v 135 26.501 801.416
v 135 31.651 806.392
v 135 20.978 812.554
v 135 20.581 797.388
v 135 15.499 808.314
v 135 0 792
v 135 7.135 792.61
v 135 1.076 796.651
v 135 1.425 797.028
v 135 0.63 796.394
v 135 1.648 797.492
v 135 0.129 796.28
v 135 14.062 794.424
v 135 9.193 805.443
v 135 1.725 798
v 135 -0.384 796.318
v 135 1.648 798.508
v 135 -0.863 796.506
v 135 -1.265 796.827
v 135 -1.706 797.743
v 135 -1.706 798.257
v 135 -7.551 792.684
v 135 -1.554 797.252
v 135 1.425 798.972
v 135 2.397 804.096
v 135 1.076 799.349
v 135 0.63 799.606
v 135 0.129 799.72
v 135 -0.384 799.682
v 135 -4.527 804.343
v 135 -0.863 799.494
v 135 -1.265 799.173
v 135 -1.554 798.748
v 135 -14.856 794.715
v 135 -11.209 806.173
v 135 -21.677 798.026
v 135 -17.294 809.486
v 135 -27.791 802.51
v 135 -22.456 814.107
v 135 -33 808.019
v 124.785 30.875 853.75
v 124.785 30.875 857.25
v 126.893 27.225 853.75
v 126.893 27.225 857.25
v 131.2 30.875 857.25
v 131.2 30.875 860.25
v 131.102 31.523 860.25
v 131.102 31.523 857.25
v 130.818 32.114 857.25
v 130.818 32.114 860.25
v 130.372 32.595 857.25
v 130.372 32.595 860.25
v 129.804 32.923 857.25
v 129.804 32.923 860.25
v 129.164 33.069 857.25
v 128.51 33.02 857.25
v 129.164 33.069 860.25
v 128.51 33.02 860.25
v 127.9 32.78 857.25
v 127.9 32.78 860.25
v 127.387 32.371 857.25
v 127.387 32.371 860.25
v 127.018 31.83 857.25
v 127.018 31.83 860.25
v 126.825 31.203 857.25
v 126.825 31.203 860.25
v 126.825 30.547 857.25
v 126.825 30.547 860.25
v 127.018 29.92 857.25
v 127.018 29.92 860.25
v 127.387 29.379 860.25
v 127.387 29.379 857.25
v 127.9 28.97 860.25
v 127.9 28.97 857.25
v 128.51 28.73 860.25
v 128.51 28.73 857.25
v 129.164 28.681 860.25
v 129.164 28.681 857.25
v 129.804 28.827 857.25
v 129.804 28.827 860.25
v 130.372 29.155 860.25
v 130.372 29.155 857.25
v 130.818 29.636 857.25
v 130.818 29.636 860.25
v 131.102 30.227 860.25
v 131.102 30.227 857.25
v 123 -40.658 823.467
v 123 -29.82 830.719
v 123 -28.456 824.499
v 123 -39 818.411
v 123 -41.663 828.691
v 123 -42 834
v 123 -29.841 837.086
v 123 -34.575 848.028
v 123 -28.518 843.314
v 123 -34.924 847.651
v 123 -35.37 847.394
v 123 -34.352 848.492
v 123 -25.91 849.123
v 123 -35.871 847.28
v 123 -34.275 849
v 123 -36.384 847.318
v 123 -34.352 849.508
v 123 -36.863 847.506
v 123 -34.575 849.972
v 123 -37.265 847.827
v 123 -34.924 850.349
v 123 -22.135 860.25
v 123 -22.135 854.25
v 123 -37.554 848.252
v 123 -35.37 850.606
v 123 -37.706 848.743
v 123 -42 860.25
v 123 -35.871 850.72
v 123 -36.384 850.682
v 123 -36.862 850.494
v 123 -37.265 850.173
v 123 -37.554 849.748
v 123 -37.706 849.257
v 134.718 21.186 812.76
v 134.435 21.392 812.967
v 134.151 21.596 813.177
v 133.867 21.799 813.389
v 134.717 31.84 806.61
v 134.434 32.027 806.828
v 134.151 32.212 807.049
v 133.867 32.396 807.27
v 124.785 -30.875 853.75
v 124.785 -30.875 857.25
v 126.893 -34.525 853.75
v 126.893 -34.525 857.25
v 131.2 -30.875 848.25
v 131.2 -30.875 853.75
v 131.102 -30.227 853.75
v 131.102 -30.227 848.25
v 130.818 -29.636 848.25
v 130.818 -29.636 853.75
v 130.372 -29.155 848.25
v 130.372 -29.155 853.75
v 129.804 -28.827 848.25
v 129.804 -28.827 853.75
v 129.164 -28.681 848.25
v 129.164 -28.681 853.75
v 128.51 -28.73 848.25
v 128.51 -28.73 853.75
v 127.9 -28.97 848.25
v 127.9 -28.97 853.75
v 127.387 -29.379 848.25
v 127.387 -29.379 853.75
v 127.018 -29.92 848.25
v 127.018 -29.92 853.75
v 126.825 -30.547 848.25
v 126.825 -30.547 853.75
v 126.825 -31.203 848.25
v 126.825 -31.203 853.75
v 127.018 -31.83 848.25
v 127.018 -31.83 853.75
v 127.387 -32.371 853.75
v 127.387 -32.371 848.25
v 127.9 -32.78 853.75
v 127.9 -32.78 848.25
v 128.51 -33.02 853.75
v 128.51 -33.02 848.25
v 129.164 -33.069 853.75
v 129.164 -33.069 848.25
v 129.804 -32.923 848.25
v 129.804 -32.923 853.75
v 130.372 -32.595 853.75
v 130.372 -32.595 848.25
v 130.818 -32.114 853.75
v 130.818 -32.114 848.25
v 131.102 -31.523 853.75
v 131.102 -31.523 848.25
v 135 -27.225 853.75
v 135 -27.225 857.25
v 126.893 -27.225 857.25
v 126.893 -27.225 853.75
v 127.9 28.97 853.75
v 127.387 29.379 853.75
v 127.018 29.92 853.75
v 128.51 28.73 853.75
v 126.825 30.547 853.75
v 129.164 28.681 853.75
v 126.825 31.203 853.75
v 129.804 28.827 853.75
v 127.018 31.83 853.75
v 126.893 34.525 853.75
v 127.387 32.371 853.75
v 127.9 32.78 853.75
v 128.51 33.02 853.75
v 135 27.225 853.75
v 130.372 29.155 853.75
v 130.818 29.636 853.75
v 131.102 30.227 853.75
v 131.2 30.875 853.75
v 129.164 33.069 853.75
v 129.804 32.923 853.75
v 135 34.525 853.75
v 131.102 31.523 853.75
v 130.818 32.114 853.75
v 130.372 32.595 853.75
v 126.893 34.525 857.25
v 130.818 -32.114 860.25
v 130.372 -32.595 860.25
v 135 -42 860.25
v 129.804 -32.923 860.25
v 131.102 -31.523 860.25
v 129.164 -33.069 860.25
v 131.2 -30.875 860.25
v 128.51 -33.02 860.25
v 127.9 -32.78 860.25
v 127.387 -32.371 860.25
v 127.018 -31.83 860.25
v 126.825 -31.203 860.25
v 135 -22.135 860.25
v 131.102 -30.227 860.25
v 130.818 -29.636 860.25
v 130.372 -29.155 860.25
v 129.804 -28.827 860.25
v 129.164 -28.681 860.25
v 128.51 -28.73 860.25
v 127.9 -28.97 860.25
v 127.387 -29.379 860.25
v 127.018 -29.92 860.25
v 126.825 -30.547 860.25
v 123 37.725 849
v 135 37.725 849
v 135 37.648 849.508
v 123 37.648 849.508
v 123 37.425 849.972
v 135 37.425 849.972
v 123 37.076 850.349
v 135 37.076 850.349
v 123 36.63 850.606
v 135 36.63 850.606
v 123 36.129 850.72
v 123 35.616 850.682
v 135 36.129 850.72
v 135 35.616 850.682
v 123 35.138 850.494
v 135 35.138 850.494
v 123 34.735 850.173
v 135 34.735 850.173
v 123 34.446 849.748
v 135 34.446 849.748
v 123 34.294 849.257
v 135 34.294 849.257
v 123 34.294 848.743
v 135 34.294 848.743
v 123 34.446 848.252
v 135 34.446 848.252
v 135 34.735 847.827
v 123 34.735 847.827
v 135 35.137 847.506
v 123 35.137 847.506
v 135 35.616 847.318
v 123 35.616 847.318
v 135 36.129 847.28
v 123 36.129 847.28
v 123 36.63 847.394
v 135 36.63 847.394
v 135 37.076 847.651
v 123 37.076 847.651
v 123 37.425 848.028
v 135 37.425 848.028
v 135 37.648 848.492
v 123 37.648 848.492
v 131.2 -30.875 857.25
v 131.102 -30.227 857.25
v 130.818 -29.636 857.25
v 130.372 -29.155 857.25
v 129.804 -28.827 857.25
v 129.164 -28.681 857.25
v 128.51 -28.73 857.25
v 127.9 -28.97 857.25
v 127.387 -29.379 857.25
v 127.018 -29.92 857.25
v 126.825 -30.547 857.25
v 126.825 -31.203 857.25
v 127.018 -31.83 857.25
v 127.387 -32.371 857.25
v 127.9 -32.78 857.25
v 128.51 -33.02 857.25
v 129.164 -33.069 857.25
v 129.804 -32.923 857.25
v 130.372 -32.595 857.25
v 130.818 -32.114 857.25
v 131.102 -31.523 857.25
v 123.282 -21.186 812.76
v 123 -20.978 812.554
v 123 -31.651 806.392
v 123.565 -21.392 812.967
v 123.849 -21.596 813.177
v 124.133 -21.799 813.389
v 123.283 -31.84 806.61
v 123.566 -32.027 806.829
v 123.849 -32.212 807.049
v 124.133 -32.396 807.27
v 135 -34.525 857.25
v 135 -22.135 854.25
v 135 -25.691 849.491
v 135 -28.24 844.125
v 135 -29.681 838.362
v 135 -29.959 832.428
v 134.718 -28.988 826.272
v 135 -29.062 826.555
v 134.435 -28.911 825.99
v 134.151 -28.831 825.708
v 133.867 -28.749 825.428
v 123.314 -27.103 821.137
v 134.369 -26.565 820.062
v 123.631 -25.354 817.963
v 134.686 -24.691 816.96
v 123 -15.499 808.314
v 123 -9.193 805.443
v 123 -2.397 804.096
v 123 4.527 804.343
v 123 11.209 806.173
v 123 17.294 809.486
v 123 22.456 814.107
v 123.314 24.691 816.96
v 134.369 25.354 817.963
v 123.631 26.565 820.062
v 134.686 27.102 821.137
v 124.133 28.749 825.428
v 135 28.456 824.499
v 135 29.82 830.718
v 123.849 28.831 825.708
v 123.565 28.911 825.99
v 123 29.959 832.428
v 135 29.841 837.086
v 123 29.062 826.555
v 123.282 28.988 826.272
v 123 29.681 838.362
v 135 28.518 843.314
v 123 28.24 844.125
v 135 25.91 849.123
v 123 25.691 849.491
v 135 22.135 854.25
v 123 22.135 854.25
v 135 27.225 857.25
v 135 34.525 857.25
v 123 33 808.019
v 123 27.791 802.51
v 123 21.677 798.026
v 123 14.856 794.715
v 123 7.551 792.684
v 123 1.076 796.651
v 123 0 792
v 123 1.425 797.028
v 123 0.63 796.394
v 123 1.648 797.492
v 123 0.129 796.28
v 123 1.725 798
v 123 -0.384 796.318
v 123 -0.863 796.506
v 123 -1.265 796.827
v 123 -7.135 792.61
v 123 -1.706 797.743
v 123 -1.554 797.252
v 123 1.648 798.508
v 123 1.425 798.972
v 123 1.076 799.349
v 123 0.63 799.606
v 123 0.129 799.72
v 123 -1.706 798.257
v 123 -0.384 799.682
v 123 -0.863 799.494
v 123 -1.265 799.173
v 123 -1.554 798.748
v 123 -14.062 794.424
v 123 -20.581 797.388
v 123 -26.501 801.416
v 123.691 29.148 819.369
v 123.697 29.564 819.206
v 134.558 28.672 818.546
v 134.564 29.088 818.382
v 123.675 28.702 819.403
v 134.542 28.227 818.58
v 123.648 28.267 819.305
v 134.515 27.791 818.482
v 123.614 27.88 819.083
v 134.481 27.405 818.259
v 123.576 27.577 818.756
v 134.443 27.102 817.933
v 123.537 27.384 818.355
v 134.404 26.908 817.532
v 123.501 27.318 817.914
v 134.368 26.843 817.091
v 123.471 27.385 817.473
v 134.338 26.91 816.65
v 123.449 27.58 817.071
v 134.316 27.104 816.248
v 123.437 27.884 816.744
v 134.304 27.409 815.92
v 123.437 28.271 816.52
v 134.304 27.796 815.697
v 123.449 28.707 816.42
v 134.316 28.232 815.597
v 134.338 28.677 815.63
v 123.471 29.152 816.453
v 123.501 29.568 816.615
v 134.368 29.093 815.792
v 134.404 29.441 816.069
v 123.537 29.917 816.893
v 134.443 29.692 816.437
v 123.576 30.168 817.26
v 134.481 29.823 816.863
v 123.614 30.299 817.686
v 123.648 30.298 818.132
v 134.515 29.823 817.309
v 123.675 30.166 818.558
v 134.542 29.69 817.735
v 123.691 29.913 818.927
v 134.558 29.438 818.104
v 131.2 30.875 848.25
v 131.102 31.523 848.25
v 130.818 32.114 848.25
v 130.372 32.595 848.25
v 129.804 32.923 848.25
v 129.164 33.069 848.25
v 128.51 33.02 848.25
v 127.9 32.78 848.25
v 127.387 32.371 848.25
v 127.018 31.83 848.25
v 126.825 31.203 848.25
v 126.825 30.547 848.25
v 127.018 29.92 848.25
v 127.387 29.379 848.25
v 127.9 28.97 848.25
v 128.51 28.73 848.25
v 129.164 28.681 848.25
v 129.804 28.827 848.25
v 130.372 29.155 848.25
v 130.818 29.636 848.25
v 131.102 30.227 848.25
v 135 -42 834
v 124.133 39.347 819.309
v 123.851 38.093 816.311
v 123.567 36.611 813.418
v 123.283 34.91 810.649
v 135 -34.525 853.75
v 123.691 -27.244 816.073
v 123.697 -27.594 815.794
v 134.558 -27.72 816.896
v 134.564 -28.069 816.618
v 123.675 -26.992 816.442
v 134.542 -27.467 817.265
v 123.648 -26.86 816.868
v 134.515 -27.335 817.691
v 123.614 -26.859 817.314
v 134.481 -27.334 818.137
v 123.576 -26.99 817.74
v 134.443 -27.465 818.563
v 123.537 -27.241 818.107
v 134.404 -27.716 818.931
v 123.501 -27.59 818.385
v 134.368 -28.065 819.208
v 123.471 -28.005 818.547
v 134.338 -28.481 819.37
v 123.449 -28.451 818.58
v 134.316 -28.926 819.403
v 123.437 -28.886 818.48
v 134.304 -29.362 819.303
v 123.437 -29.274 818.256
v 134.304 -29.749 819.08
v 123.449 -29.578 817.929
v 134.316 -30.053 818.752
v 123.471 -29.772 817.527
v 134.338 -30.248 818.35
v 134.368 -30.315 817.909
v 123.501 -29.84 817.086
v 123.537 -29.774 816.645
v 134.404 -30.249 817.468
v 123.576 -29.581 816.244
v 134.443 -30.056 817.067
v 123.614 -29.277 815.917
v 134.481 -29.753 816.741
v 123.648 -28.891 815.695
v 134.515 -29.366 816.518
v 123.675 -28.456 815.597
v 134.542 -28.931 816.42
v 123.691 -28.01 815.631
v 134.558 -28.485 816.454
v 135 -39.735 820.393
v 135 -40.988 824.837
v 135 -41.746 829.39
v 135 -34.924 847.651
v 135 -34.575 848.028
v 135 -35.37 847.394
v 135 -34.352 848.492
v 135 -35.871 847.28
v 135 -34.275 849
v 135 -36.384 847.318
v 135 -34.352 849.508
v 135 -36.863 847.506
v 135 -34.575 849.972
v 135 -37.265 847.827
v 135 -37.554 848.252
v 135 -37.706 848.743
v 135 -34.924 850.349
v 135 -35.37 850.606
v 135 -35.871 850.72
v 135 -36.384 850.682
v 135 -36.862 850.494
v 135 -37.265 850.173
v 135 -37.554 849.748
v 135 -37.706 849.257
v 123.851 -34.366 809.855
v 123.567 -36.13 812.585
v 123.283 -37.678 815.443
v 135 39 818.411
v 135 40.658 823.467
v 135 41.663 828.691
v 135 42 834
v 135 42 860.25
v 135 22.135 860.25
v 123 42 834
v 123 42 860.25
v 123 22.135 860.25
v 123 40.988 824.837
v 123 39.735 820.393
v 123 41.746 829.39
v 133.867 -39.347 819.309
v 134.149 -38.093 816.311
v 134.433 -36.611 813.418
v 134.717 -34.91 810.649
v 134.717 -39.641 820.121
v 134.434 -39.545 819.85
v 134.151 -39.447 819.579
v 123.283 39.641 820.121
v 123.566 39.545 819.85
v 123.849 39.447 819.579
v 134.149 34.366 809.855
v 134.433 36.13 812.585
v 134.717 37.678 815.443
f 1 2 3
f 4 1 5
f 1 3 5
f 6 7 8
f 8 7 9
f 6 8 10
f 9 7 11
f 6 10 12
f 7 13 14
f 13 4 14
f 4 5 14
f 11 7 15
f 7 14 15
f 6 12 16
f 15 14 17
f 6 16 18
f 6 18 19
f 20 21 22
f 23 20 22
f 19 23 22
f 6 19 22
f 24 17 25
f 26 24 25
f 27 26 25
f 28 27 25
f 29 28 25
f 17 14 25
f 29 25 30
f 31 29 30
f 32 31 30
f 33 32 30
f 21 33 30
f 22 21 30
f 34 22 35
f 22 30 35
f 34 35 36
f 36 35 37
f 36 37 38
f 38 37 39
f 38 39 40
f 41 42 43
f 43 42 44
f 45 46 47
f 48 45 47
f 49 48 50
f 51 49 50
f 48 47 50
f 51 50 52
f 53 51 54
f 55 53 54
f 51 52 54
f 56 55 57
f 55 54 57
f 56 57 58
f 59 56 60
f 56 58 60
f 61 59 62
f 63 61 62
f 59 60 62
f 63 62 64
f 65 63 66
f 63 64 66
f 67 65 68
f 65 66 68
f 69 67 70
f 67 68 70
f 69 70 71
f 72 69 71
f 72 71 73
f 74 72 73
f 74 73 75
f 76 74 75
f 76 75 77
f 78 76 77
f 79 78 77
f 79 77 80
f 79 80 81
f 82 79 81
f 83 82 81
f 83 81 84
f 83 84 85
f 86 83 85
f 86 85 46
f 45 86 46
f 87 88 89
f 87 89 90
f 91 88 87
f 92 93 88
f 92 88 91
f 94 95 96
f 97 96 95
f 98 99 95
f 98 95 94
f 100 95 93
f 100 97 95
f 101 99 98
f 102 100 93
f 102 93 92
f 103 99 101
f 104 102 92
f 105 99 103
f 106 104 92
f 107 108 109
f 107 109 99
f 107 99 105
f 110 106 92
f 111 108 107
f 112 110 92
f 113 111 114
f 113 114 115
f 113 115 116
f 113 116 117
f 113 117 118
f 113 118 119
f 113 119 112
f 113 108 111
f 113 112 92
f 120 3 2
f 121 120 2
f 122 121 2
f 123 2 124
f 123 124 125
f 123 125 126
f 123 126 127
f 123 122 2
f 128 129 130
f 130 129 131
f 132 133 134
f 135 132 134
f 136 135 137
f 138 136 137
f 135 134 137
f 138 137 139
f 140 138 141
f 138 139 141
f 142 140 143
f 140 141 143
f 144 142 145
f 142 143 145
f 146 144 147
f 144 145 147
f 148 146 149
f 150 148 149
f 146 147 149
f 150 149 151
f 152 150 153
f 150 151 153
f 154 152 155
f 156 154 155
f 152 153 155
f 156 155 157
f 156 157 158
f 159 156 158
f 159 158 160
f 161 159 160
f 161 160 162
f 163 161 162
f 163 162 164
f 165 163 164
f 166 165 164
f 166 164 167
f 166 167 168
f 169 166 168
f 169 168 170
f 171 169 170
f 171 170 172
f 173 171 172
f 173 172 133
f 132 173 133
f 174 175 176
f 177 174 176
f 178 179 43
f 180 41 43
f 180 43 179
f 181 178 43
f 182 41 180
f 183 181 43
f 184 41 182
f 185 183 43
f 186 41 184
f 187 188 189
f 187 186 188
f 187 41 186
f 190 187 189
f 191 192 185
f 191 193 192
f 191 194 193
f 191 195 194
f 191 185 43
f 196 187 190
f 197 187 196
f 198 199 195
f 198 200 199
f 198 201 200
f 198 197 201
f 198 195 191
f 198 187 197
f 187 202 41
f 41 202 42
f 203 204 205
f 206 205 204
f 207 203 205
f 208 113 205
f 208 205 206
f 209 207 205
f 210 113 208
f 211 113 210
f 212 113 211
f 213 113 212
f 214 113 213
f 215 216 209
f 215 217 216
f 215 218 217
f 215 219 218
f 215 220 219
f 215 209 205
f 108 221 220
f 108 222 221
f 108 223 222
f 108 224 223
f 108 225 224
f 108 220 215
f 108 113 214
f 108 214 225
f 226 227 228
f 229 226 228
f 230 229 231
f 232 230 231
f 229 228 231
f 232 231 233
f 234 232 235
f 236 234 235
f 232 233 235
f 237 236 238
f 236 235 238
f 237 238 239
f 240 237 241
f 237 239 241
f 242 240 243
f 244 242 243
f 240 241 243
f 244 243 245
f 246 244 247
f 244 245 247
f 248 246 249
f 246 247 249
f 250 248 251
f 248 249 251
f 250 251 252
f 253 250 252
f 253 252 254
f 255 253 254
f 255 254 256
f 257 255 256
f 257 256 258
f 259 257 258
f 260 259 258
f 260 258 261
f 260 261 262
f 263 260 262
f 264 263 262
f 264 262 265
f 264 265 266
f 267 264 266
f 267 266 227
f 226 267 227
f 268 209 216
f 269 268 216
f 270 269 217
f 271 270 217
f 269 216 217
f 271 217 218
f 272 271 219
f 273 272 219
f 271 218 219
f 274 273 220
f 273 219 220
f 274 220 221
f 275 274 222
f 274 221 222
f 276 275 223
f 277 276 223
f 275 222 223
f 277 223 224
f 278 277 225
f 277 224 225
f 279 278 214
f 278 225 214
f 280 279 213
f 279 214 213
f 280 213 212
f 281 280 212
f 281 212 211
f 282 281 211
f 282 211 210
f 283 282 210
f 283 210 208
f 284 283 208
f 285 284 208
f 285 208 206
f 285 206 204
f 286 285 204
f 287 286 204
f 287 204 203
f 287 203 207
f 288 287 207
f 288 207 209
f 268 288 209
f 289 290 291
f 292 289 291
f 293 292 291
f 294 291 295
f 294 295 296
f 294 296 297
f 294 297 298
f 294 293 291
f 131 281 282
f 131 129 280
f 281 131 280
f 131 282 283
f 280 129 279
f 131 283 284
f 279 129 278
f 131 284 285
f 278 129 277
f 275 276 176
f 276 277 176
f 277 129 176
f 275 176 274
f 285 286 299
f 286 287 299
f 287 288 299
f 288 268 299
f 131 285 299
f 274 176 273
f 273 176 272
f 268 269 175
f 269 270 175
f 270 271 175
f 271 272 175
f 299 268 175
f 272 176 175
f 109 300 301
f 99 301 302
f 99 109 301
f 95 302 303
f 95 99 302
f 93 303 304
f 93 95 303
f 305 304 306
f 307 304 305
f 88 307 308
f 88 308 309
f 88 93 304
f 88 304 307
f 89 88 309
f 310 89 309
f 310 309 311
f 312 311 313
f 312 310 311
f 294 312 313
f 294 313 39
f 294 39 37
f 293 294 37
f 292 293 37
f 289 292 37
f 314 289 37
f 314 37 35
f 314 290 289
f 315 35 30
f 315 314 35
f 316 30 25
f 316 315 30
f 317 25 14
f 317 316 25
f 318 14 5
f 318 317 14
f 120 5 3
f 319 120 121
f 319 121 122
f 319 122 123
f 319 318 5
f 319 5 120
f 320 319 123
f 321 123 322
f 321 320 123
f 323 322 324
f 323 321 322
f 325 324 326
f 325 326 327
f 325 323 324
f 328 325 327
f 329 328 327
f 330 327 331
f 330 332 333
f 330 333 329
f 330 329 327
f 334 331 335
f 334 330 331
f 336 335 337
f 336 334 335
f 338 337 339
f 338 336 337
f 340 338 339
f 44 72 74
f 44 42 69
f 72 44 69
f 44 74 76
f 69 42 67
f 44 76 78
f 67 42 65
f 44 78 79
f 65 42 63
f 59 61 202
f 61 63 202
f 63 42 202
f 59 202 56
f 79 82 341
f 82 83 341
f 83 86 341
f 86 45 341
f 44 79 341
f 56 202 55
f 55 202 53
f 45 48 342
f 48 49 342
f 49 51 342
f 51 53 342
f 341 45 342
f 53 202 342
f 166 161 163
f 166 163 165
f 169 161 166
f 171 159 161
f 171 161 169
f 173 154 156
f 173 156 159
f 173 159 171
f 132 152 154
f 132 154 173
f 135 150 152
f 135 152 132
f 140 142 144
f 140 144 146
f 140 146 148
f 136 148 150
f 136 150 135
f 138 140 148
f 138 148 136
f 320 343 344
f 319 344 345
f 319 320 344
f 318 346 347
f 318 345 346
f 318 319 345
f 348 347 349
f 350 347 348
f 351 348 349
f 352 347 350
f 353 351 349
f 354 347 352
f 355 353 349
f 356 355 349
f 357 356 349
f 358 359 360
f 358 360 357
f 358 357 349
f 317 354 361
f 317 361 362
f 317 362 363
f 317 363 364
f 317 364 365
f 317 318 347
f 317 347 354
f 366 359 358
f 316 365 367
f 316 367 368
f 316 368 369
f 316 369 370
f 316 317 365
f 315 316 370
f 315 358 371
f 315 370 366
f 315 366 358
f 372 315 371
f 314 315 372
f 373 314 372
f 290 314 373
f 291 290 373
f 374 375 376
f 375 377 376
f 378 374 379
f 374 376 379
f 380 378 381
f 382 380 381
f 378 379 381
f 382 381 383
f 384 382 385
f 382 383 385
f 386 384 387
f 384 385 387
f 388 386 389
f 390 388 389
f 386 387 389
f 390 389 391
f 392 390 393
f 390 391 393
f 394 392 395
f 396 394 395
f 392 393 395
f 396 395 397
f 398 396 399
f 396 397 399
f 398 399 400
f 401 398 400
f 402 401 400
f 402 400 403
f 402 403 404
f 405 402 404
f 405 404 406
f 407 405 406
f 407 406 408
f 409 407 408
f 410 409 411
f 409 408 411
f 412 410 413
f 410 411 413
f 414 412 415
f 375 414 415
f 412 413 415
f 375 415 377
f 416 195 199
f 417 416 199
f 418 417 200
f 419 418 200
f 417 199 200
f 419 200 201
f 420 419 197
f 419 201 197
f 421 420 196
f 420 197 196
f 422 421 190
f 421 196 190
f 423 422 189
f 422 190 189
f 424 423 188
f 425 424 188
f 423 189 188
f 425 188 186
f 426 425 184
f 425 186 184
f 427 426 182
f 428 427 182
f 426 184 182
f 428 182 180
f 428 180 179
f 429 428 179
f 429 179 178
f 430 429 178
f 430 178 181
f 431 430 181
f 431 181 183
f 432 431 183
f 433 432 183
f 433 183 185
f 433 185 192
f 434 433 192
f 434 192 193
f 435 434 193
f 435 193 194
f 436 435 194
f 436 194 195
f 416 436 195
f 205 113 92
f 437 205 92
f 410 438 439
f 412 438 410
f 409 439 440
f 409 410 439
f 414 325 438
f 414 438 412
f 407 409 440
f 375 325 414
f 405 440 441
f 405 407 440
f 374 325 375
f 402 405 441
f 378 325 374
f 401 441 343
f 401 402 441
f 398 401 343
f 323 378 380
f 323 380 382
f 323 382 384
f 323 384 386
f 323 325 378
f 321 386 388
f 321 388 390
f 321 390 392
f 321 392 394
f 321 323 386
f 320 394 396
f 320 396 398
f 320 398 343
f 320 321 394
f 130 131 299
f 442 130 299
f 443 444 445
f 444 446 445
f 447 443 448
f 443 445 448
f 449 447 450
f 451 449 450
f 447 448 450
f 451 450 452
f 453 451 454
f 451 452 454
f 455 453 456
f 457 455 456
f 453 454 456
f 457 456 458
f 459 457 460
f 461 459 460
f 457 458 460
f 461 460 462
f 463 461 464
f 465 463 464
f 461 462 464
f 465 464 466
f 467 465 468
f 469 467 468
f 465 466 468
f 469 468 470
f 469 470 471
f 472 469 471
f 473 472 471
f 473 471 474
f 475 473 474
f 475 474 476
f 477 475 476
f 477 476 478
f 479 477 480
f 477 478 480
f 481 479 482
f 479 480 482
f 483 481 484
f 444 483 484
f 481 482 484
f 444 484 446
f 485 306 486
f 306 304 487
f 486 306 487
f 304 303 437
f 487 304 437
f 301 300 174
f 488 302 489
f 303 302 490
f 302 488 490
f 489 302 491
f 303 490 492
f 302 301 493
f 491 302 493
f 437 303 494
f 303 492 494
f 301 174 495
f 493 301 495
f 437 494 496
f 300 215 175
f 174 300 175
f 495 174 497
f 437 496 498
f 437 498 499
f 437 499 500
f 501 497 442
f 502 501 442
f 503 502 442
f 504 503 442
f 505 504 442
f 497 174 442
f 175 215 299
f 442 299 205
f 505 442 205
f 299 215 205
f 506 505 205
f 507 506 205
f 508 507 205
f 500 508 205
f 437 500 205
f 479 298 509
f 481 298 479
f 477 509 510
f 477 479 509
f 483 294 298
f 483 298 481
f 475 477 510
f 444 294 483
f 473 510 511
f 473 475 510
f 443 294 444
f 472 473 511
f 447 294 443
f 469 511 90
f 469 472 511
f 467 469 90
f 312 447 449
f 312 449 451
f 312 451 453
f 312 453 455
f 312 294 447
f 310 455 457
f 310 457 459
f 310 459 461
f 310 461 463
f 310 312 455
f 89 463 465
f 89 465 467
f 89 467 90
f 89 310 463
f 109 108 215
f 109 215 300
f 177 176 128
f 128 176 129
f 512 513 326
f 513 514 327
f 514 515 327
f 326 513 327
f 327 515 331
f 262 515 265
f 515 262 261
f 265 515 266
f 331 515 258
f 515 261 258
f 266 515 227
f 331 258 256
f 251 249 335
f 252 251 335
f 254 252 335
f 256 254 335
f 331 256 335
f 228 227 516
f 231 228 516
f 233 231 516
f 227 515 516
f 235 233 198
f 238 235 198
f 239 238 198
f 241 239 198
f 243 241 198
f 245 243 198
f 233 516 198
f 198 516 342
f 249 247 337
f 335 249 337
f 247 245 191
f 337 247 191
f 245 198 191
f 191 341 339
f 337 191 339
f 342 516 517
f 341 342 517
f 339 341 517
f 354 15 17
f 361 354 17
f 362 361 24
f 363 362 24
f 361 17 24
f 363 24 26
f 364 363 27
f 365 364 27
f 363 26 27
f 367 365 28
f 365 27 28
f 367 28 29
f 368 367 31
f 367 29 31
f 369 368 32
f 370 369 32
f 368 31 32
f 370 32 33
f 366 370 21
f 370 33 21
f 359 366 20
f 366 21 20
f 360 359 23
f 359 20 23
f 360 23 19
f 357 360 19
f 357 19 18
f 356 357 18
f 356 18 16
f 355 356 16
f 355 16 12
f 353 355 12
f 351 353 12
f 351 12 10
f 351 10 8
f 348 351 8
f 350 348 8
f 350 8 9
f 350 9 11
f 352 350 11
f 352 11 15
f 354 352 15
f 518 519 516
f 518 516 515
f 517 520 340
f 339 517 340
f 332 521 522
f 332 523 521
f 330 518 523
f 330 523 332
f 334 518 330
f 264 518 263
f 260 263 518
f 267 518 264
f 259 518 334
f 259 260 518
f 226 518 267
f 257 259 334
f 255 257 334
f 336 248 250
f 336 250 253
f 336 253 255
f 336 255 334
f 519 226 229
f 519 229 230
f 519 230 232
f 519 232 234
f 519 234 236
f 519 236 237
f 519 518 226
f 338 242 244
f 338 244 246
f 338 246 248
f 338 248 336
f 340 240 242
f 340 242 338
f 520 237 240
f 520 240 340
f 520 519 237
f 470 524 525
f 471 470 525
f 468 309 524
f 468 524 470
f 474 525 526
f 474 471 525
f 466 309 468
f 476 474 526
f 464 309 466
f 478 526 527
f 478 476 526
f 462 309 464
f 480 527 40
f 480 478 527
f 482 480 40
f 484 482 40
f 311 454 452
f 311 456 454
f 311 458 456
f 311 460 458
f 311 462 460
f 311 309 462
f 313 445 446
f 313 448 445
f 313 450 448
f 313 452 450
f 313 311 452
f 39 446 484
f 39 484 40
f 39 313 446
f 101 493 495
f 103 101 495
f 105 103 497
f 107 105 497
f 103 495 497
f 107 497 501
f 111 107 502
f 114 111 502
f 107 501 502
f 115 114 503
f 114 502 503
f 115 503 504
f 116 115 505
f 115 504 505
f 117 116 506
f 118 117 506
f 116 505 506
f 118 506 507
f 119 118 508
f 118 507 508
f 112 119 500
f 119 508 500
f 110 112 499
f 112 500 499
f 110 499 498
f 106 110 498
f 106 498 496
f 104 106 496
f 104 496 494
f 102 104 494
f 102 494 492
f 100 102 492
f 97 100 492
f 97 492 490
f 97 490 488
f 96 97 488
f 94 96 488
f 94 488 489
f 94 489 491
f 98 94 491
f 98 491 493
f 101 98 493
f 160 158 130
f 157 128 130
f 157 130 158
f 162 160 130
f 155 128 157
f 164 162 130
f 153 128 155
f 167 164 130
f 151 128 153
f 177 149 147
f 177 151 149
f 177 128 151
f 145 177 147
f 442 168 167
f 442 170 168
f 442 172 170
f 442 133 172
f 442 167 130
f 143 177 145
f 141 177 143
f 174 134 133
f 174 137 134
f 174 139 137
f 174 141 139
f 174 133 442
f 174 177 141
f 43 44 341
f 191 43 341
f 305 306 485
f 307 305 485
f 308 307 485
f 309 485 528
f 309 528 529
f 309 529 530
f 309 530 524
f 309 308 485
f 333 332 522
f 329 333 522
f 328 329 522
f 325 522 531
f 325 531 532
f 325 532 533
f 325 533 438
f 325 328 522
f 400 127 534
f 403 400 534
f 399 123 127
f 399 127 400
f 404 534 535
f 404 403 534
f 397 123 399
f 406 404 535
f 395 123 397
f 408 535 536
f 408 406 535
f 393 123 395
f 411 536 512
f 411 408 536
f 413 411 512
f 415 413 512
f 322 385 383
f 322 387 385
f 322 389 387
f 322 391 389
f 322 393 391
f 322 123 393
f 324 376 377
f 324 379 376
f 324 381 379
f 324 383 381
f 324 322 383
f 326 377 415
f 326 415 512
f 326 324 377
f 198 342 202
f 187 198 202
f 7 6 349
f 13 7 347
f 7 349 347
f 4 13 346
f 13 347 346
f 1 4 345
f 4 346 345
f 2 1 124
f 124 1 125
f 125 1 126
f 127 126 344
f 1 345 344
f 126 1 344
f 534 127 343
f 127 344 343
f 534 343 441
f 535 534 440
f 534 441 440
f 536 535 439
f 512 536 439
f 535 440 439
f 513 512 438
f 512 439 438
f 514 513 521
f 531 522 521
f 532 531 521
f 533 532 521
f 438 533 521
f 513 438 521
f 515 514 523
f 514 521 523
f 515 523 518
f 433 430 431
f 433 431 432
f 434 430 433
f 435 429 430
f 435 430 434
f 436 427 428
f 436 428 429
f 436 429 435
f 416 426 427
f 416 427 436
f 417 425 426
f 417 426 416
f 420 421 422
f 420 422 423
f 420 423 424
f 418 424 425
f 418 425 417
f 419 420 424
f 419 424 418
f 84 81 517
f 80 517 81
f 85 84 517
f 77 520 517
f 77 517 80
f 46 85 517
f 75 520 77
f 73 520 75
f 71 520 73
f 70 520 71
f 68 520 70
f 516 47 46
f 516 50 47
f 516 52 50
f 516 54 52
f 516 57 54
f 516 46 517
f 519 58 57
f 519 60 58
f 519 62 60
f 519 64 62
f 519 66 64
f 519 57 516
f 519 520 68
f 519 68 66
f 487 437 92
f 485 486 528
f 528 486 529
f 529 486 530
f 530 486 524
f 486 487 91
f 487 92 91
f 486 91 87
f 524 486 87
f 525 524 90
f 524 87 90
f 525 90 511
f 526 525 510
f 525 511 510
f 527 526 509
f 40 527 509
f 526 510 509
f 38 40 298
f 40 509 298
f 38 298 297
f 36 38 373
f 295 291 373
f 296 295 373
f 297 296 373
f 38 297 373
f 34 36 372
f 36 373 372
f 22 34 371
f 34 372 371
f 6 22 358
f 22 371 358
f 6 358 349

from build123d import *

# Parameters (mm, degrees)
PAD006_DEPTH          = 12
SKETCH077_R           = 1.725
HOLE036_DEPTH         = 12.001
SKETCH067_R           = 2.2
POCKET040_DEPTH       = 12
POCKET041_DEPTH       = 3.5
SKETCH027_R           = 1.5
POCKET042_DEPTH       = 227.579227
POCKET042_DEPTH_BACK  = 228.768023
POCKET043_DEPTH       = 275.16353
POLARPATTERN003_COUNT = 2
POLARPATTERN003_ANGLE = 240


with BuildPart() as part:
    # Sketch021 → Pad006 (new body)
    with BuildSketch(Plane.YZ):
        with BuildLine():
            Line((-42, 26.25), (-22.134532, 26.25))
            Line((-22.134532, 26.25), (-22.134532, 20.25))
            ThreePointArc((-22.134532, 20.25), (0, -30), (22.134532, 20.25))
            Line((22.134532, 26.25), (22.134532, 20.25))
            Line((22.134532, 26.25), (42, 26.25))
            Line((42, 26.25), (42, 7.3e-05))
            ThreePointArc((0, -42), (29.698511, -29.698459), (42, 7.3e-05))
            ThreePointArc((-42, 7.2e-05), (-29.69851, -29.69846), (0, -42))
            Line((-42, 26.25), (-42, 7.2e-05))
        make_face()
    extrude(amount=PAD006_DEPTH)

    # Sketch077 (on DatumPlane) → Hole036 (cut, through all)
    with BuildSketch(Plane.YZ.offset(12)):
        with Locations((0, -36)):
            Circle(SKETCH077_R)
        with Locations((-36, 15)):
            Circle(SKETCH077_R)
        with Locations((36, 15)):
            Circle(SKETCH077_R)
    extrude(amount=-HOLE036_DEPTH, mode=Mode.SUBTRACT)

    # Sketch067 (on DatumPlane) → Pocket040 (cut)
    with BuildSketch(Plane(origin=(6, 0, 26.25), x_dir=(1, 0, 0), z_dir=(0, 0, 1))):
        with Locations((0, 30.875)):
            Circle(SKETCH067_R)
        with Locations((0, -30.875)):
            Circle(SKETCH067_R)
    extrude(amount=-POCKET040_DEPTH, mode=Mode.SUBTRACT)

    # Sketch068 (on DatumPlane) → Pocket041 (cut)
    with BuildSketch(Plane(origin=(6, 0, 23.25), x_dir=(1, 0, 0), z_dir=(0, 0, 1))):
        Polygon((-2.107328, -27.225), (-4.214657, -30.875), (-2.107328, -34.525), (9.892672, -34.525), (9.892672, -27.225), align=None)
        Polygon((-2.107328, 34.525), (-4.214657, 30.875), (-2.107328, 27.225), (9.892672, 27.225), (9.892672, 34.525), align=None)
    extrude(amount=-POCKET041_DEPTH, mode=Mode.SUBTRACT)

    # Sketch027 (on DatumPlane) → Pocket042 (cut, two sides)
    with BuildSketch(Plane(origin=(6, 0, 0), x_dir=(0.087156, 0.498097, 0.86273), z_dir=(0.996195, -0.043578, -0.075479))) as pocket042_sk:
        with Locations((0, -33)):
            Circle(SKETCH027_R)
    pocket042 = extrude(amount=-POCKET042_DEPTH, mode=Mode.SUBTRACT) + extrude(pocket042_sk.sketch, amount=POCKET042_DEPTH_BACK, mode=Mode.SUBTRACT)

    # Sketch066 (on DatumPlane) → Pocket043 (cut, through all)
    with BuildSketch(Plane(origin=(6, 0, 0), x_dir=(1, 0, 0), z_dir=(0, -0.866025, 0.5))):
        Polygon((6, 5.999897), (7, 5.999897), (7, -9.083659), (4.866975, -6.950634), align=None)
        Polygon((-7, 9.083659), (-4.866975, 6.950634), (-6, -5.999897), (-7, -5.999897), align=None)
    pocket043 = extrude(amount=-POCKET043_DEPTH, mode=Mode.SUBTRACT)

    # PolarPattern003: Pocket043, Pocket042 ×2 about axis
    polarpattern003_axis = Axis((0, 0, 0), (1, 0, 0))
    for i in range(1, POLARPATTERN003_COUNT):
        add(pocket043.rotate(polarpattern003_axis, i * POLARPATTERN003_ANGLE / (POLARPATTERN003_COUNT - 1)), mode=Mode.SUBTRACT)
        add(pocket042.rotate(polarpattern003_axis, i * POLARPATTERN003_ANGLE / (POLARPATTERN003_COUNT - 1)), mode=Mode.SUBTRACT)


with BuildPart() as part_1:
    # Body022004 placement: moved
    add(part.part.moved(Location((123, 0, 834))))


solid = part_1.part
